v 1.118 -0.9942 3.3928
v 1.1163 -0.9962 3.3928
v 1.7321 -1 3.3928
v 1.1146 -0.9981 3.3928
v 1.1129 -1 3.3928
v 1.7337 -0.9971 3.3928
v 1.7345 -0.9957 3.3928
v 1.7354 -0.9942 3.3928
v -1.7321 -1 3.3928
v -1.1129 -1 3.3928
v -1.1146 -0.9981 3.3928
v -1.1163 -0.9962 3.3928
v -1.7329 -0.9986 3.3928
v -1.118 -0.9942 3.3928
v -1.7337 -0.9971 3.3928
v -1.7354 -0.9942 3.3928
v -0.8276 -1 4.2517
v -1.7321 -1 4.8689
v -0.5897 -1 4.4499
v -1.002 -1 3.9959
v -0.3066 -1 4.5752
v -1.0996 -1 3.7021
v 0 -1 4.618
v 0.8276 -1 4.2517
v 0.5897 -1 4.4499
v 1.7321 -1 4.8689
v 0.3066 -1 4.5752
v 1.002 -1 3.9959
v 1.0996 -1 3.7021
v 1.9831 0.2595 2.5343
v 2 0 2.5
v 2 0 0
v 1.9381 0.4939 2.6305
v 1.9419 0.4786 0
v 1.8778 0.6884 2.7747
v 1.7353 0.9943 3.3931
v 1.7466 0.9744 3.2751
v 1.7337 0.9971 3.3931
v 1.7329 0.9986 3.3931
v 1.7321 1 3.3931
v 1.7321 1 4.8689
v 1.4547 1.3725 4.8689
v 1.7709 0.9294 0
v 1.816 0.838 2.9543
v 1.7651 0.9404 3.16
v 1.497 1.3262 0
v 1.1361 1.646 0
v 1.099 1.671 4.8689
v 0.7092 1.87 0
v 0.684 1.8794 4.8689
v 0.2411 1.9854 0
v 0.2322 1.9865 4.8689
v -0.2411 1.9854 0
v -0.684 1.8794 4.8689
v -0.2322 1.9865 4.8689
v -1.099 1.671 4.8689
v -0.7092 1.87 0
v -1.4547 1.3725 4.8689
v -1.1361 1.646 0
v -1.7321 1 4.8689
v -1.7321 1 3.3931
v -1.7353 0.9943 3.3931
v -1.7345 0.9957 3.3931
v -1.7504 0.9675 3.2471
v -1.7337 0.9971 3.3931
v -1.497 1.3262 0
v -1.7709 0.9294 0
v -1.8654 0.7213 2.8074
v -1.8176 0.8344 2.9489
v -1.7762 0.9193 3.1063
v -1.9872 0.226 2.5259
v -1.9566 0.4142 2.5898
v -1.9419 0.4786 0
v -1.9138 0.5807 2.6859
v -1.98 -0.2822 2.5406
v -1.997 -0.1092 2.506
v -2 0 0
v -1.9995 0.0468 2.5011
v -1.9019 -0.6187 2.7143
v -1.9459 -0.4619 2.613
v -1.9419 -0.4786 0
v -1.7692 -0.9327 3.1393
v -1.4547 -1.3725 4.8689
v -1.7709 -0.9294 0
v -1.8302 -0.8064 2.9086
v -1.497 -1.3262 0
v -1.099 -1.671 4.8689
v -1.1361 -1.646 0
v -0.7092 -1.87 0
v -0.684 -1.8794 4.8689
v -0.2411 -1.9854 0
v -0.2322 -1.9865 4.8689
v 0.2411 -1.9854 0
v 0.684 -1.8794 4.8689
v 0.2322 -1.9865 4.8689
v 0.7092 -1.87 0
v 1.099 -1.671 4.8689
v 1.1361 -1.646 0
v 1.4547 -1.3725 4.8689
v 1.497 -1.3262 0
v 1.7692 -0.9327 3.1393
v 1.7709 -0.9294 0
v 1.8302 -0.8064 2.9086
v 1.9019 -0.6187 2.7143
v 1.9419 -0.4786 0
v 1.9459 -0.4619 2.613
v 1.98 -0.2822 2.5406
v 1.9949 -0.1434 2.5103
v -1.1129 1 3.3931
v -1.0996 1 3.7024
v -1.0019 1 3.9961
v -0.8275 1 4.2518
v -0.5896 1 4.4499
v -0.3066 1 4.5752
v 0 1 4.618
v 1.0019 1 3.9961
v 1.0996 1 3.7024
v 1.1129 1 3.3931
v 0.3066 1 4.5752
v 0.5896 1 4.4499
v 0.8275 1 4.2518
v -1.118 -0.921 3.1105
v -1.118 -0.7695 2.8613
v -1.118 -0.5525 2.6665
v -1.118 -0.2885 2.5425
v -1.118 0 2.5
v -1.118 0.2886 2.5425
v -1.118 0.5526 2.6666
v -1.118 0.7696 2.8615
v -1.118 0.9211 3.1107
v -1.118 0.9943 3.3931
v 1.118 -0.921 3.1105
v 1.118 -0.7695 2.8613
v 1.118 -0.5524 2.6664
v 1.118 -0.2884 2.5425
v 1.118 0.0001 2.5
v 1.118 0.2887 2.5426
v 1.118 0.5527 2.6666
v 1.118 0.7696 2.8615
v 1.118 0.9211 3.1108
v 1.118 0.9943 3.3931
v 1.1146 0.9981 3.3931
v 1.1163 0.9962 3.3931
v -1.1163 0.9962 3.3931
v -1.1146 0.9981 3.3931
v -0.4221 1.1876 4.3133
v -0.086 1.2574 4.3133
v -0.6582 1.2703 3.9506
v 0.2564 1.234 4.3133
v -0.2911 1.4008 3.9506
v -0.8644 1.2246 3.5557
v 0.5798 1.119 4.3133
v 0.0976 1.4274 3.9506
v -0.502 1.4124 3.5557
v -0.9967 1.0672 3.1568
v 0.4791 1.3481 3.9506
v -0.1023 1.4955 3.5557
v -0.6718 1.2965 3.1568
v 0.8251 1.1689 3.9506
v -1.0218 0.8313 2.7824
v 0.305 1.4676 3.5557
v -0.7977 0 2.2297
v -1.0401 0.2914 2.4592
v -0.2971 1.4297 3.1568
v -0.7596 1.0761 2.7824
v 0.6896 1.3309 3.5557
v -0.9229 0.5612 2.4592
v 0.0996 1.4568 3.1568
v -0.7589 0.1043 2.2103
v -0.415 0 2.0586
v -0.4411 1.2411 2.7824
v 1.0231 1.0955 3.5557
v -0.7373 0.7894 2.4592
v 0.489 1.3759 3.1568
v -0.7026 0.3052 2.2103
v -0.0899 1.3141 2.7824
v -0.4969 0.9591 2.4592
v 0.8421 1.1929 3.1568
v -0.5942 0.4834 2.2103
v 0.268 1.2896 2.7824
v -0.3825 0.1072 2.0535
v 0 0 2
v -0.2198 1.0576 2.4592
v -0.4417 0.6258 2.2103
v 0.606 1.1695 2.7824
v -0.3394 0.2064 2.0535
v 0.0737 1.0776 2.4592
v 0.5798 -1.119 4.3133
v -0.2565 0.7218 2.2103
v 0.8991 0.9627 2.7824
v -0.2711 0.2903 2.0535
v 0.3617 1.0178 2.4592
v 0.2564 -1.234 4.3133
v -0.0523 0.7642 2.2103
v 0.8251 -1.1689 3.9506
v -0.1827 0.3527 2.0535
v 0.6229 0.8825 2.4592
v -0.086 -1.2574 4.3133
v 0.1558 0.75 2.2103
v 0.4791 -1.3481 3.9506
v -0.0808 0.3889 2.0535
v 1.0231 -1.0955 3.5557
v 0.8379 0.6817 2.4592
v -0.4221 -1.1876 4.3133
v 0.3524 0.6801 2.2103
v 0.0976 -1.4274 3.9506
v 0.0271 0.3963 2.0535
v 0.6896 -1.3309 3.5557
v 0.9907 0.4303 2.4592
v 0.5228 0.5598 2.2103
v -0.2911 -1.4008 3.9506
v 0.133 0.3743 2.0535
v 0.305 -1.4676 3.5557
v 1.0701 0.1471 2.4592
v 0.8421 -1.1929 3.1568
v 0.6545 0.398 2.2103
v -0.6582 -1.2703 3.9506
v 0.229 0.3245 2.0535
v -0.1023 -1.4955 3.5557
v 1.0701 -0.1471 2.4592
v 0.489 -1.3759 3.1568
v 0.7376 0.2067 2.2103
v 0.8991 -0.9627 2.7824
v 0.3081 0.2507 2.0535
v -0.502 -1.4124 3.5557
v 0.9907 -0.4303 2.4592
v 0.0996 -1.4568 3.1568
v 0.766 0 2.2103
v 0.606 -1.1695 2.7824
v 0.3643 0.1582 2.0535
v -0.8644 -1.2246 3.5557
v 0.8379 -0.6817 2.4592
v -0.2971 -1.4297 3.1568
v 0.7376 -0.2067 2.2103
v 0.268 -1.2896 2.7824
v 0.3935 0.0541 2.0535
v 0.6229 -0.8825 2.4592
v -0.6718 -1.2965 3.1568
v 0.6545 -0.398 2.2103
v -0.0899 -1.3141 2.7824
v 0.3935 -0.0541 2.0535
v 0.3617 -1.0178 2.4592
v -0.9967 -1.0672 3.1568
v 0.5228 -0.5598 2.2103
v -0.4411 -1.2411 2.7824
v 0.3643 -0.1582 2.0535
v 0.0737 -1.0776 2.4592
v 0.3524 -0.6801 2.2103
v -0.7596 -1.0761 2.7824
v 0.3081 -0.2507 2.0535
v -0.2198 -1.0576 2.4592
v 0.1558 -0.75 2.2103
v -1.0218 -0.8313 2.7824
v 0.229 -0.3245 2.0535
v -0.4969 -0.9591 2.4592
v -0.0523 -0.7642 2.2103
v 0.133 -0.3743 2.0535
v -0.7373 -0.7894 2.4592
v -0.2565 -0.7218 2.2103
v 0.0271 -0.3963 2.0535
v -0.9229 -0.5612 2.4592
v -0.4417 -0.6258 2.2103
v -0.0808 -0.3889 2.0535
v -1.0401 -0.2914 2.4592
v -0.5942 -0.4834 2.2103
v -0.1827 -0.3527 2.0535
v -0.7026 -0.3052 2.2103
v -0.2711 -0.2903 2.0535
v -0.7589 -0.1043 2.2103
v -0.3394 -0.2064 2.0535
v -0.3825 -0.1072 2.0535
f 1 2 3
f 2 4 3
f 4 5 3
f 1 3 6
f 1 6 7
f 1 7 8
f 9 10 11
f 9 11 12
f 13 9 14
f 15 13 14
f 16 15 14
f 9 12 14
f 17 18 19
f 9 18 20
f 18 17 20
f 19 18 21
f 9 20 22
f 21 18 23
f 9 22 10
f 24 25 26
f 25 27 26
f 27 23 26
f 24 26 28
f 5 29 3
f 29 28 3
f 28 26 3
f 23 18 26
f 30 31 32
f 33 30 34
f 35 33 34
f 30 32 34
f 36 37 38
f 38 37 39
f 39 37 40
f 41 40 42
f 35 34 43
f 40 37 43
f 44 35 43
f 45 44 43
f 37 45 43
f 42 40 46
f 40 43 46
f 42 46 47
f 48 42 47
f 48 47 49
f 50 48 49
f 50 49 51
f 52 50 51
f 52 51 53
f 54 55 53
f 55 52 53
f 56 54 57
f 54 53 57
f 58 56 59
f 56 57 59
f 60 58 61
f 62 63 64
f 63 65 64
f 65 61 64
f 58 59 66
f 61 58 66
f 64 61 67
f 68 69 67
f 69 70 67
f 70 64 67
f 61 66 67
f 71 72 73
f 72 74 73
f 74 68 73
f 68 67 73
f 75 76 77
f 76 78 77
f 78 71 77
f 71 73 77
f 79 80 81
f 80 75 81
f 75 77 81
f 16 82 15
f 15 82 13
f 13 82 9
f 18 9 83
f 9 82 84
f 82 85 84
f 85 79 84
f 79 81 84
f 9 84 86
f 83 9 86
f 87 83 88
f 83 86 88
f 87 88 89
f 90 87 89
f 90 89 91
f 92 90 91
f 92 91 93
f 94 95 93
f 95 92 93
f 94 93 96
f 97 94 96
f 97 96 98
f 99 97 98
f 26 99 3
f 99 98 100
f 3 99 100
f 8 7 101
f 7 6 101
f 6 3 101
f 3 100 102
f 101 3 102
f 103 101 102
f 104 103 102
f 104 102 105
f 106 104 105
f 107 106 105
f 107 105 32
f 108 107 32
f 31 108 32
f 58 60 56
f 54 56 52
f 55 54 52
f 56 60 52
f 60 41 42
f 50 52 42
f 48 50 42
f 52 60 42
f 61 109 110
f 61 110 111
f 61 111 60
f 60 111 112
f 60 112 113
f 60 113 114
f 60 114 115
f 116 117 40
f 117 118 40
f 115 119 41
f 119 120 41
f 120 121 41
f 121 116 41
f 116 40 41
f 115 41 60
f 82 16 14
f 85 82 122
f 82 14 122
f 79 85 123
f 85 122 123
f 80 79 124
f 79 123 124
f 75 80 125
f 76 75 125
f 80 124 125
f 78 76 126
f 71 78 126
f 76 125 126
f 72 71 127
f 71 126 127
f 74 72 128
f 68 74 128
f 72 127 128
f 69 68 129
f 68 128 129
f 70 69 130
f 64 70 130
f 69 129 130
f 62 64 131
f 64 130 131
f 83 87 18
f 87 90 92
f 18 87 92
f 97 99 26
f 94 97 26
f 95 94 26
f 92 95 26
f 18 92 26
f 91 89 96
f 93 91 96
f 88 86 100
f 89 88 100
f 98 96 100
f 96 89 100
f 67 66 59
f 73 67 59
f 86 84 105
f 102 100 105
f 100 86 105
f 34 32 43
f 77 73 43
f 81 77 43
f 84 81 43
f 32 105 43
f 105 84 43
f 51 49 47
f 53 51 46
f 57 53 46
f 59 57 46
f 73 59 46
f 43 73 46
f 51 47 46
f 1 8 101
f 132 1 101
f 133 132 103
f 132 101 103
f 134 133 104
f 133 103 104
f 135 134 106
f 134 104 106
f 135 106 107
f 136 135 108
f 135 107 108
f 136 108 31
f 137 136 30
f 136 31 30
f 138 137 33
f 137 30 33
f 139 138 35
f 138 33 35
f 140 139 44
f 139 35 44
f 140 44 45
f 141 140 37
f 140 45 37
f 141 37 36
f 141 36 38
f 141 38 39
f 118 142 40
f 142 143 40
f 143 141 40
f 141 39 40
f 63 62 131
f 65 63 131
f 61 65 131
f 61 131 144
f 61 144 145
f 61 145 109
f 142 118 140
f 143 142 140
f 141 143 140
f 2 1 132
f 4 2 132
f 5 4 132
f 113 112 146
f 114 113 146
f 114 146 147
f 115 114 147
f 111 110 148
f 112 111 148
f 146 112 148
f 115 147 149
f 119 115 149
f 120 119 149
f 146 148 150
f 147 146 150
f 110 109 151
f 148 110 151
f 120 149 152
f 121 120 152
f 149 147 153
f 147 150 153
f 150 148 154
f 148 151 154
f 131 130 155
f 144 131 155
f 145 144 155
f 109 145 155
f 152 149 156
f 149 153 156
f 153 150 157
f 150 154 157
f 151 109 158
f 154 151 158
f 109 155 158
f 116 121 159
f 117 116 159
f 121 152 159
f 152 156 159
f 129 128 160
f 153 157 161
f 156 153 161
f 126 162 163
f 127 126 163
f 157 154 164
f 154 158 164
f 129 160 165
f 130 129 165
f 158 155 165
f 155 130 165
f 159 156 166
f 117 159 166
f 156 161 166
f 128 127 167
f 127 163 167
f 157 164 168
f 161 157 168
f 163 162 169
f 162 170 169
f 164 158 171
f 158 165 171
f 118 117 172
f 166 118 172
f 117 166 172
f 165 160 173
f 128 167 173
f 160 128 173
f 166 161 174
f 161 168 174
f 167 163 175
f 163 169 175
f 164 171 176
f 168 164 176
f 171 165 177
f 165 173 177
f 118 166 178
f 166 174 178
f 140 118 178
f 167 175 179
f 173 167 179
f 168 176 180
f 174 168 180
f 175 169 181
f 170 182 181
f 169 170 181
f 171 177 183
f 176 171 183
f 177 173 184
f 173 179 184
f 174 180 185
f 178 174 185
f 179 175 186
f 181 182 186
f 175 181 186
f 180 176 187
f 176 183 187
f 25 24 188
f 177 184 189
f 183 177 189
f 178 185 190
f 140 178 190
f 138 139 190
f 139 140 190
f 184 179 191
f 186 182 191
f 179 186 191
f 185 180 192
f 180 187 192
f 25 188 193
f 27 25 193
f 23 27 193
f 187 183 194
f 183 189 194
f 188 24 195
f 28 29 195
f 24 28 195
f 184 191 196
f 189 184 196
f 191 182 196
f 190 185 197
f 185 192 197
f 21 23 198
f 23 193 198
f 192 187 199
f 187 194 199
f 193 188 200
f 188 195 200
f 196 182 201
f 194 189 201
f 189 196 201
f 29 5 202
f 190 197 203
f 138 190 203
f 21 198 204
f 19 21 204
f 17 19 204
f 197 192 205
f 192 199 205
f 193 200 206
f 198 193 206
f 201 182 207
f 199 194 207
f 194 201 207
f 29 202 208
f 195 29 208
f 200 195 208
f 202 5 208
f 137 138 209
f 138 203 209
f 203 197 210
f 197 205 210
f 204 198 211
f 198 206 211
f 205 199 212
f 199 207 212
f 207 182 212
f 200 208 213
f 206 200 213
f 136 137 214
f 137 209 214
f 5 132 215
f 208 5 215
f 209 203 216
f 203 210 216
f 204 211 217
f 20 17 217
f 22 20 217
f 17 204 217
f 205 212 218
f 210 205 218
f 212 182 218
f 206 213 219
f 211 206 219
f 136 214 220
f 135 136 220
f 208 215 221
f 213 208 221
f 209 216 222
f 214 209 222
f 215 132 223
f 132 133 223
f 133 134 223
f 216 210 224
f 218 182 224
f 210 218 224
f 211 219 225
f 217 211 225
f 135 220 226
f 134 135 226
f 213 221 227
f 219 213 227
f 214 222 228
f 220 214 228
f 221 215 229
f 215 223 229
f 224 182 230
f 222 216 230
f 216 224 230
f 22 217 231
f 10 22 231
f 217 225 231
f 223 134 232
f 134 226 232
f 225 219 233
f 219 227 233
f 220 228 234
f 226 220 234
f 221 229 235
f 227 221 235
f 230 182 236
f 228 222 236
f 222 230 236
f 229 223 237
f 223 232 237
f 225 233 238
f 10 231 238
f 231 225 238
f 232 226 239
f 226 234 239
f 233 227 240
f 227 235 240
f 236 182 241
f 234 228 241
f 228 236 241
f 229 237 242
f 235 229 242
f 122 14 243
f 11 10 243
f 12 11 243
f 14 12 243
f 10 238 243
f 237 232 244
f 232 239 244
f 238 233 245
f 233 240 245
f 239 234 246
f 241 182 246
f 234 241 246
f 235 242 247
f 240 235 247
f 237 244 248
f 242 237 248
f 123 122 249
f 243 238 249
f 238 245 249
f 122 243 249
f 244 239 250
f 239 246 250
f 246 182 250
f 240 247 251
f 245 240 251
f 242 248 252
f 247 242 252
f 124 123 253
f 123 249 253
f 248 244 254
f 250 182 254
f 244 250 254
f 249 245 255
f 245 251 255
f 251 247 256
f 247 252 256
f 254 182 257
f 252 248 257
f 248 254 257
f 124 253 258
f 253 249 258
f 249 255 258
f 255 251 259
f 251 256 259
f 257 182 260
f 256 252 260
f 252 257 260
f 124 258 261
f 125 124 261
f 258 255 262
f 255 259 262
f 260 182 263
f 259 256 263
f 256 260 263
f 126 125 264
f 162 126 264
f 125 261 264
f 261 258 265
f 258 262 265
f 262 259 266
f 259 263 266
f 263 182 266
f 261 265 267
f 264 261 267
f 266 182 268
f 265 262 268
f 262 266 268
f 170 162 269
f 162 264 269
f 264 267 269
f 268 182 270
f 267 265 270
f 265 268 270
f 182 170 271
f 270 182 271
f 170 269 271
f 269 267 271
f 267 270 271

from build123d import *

# Parameters (mm, degrees)
F0_R     = 2
F1_DEPTH = 6
F2_R     = 1
F3_DEPTH = 12.5
F5_DEPTH = 12.5
F8_W     = 12.246756
F8_H     = 2.410266
F9_DEPTH = 12.5


with BuildPart() as f1:
    # F0 (on Top) → F1 (new body)
    with BuildSketch(Plane.XY):
        Circle(F0_R)
    extrude(amount=F1_DEPTH)

    # F2 (on Right) → F3 (cut, symmetric)
    with BuildSketch(Plane.YZ):
        with Locations((0, 3.5)):
            Circle(F2_R)
    extrude(amount=F3_DEPTH, both=True, mode=Mode.SUBTRACT)

    # F4 (on Right) → F5 (cut, symmetric)
    with BuildSketch(Plane.YZ):
        Polygon((-1, 3.392821), (1, 3.393114), (1, 8.364114), (-1, 8.364114), align=None)
    extrude(amount=F5_DEPTH, both=True, mode=Mode.SUBTRACT)

    # F6 (on Front) → F7 (revolve, cut)
    with BuildSketch(Plane.XZ):
        with BuildLine():
            Line((0, 2), (0, 5))
            ThreePointArc((0, 5), (-1.5, 3.5), (0, 2))
        make_face()
    revolve(axis=Axis((0, 0, 3.5), (0, 0, -1)), mode=Mode.SUBTRACT)

    # F8 (on Right) → F9 (cut, symmetric)
    with BuildSketch(Plane.YZ):
        with Locations((0.747654, 6.073989)):
            Rectangle(F8_W, F8_H)
    extrude(amount=F9_DEPTH, both=True, mode=Mode.SUBTRACT)


solid = f1.part
